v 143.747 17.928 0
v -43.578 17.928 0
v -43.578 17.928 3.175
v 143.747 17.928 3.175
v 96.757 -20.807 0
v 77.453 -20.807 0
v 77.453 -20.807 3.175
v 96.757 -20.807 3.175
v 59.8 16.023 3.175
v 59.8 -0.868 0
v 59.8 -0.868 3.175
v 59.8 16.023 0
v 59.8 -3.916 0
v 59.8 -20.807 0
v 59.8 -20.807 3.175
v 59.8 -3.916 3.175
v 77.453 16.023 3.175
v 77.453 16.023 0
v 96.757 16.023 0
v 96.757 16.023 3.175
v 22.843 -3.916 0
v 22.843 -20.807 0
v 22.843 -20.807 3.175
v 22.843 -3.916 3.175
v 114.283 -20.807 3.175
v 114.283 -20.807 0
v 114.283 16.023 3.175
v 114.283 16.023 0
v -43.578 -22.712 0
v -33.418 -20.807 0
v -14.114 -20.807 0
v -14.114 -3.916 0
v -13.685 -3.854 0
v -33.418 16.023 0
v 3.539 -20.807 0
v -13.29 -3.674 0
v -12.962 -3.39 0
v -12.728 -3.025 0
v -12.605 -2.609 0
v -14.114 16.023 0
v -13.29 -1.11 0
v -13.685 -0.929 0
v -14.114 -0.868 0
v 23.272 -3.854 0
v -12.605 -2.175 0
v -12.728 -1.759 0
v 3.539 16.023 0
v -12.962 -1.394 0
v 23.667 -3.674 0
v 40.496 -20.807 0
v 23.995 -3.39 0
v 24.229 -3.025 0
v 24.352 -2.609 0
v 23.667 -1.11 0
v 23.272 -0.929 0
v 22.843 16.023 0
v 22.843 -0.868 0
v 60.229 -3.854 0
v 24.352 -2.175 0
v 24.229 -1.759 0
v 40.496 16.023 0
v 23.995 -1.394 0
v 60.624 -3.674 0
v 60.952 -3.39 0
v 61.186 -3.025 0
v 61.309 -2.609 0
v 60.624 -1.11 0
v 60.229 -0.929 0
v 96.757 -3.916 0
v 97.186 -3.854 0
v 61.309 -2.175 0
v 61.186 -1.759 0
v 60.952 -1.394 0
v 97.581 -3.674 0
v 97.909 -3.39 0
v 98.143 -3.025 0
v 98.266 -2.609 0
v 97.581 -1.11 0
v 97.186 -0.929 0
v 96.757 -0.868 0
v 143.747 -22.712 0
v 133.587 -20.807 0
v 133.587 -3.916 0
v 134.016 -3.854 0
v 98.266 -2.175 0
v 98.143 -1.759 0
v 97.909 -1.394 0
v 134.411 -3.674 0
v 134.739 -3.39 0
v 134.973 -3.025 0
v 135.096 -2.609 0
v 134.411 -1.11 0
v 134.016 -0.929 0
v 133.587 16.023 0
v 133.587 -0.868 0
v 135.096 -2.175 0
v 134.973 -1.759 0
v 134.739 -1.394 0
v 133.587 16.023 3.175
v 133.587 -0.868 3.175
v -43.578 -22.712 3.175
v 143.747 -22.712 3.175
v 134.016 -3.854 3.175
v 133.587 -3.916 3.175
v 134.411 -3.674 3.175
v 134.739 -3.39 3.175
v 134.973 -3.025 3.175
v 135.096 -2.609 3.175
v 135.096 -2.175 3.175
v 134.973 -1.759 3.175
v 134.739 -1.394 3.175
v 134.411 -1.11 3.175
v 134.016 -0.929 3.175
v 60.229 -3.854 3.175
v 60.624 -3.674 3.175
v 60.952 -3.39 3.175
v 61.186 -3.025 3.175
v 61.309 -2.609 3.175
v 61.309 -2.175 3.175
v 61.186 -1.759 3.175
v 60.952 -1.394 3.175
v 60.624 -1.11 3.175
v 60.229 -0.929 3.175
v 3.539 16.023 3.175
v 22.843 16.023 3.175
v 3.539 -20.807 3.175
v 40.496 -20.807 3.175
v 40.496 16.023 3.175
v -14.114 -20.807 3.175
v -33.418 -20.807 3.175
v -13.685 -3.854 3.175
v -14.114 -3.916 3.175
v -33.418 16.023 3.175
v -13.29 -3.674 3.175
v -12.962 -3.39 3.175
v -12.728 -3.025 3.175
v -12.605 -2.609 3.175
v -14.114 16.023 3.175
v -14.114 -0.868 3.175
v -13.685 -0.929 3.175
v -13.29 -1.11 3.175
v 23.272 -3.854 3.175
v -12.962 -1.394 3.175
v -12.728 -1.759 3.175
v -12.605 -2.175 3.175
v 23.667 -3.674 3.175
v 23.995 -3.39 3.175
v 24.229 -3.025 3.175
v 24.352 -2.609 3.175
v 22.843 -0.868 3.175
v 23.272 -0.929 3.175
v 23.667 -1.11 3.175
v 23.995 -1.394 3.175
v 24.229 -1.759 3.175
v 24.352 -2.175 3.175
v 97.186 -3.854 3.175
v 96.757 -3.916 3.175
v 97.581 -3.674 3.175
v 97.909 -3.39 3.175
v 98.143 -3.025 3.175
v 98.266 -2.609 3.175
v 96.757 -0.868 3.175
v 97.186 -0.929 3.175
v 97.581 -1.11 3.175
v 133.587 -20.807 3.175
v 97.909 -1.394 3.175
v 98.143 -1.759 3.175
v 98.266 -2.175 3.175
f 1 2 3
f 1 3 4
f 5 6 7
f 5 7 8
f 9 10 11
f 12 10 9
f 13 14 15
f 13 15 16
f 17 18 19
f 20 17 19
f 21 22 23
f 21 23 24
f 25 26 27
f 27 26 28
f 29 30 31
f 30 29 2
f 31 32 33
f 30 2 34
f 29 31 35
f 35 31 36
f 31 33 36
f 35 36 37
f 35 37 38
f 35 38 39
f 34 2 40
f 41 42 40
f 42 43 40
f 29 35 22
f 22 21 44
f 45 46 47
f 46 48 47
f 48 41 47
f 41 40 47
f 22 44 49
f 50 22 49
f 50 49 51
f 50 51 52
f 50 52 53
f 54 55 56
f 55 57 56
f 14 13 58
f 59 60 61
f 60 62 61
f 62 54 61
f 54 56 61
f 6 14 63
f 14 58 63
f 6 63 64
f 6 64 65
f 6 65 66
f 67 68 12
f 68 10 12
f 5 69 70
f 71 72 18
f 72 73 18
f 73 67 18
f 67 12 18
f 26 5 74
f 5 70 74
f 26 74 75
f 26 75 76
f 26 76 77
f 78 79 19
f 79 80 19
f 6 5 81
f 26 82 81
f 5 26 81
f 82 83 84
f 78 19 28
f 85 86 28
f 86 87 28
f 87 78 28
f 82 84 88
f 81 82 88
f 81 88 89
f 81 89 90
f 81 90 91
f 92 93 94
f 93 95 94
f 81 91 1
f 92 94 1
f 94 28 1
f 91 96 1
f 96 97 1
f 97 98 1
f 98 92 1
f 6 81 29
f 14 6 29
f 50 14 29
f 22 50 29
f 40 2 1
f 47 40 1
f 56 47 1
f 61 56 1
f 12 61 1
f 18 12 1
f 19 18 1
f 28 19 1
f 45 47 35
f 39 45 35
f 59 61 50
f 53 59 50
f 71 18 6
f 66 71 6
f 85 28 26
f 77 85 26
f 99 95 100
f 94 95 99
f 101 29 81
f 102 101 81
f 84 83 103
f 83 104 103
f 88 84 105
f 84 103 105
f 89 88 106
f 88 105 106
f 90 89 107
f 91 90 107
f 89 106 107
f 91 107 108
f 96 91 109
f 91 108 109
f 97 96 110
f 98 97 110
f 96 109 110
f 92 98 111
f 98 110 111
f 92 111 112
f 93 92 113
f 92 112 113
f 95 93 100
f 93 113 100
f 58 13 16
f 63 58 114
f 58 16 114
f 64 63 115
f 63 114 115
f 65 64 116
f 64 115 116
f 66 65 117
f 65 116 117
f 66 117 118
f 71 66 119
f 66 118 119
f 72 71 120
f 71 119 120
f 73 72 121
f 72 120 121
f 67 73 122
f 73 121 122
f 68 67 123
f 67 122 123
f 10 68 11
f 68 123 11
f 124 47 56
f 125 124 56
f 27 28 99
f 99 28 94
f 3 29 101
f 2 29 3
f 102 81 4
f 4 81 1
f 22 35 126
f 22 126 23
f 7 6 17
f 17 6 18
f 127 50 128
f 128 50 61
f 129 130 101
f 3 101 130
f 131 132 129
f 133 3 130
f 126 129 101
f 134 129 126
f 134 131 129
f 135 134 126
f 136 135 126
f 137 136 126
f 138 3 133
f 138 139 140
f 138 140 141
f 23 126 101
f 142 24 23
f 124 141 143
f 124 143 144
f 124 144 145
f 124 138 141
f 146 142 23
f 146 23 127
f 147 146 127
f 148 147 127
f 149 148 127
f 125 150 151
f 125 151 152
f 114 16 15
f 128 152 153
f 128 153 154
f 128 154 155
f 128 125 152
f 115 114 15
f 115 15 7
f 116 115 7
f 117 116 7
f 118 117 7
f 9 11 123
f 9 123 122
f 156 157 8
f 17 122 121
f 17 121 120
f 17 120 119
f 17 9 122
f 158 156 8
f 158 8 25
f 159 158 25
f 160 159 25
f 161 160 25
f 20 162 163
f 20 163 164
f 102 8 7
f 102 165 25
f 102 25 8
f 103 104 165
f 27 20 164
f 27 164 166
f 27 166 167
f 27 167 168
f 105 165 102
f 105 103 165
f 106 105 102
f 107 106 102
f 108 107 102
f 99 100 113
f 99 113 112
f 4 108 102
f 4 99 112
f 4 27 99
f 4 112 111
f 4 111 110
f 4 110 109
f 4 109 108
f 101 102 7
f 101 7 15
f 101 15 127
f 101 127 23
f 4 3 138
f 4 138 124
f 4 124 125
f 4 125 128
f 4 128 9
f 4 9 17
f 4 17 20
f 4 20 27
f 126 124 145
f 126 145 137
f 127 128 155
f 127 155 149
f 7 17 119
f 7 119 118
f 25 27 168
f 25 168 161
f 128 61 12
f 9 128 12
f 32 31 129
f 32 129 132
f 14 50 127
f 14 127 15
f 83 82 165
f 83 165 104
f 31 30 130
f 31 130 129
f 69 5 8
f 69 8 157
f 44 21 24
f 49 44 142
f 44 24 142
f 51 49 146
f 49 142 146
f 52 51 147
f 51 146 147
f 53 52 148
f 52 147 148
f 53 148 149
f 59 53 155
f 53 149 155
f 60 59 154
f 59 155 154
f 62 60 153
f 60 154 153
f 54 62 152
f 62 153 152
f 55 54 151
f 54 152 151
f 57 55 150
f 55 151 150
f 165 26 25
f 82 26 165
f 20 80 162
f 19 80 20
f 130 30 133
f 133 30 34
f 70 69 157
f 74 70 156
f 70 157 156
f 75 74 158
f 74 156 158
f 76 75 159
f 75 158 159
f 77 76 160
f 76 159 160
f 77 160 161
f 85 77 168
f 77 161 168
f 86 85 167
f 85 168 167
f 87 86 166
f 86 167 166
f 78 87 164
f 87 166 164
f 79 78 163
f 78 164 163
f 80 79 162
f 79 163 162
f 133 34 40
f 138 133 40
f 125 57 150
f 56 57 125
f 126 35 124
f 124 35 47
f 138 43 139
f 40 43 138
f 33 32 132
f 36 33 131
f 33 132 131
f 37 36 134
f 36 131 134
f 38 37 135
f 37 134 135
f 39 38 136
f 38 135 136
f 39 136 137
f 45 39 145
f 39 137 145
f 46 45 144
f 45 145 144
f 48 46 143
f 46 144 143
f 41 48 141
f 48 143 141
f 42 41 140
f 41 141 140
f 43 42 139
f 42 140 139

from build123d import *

# Parameters (mm, degrees)
F0_W     = 187.325
F0_H     = 40.64
F0_W_2   = 19.304
F0_H_2   = 36.83
F1_DEPTH = 3.175
F2_R     = 1.524
F3_DEPTH = 6.35


with BuildPart() as f1:
    # F0 (on Top) → F1 (new body)
    with BuildSketch(Plane.XY):
        with Locations((50.084582, -2.391732)):
            Rectangle(F0_W, F0_H)
        with Locations((50.148082, -2.391732)):
            Rectangle(F0_W_2, F0_H_2, mode=Mode.SUBTRACT)
        with Locations((-23.765918, -2.391732)):
            Rectangle(F0_W_2, F0_H_2, mode=Mode.SUBTRACT)
        with Locations((13.191082, -2.391732)):
            Rectangle(F0_W_2, F0_H_2, mode=Mode.SUBTRACT)
        with Locations((87.105082, -2.391732)):
            Rectangle(F0_W_2, F0_H_2, mode=Mode.SUBTRACT)
        with Locations((123.935082, -2.391732)):
            Rectangle(F0_W_2, F0_H_2, mode=Mode.SUBTRACT)
    extrude(amount=F1_DEPTH)

    # F2 (on face) → F3 (cut, symmetric)
    with BuildSketch(Plane.XY.offset(3.175)):
        with Locations((-14.113918, -2.391732)):
            Circle(F2_R)
        with Locations((22.843082, -2.391732)):
            Circle(F2_R)
        with Locations((59.800082, -2.391732)):
            Circle(F2_R)
        with Locations((96.757082, -2.391732)):
            Circle(F2_R)
        with Locations((133.587082, -2.391732)):
            Circle(F2_R)
    extrude(amount=F3_DEPTH, both=True, mode=Mode.SUBTRACT)


solid = f1.part
